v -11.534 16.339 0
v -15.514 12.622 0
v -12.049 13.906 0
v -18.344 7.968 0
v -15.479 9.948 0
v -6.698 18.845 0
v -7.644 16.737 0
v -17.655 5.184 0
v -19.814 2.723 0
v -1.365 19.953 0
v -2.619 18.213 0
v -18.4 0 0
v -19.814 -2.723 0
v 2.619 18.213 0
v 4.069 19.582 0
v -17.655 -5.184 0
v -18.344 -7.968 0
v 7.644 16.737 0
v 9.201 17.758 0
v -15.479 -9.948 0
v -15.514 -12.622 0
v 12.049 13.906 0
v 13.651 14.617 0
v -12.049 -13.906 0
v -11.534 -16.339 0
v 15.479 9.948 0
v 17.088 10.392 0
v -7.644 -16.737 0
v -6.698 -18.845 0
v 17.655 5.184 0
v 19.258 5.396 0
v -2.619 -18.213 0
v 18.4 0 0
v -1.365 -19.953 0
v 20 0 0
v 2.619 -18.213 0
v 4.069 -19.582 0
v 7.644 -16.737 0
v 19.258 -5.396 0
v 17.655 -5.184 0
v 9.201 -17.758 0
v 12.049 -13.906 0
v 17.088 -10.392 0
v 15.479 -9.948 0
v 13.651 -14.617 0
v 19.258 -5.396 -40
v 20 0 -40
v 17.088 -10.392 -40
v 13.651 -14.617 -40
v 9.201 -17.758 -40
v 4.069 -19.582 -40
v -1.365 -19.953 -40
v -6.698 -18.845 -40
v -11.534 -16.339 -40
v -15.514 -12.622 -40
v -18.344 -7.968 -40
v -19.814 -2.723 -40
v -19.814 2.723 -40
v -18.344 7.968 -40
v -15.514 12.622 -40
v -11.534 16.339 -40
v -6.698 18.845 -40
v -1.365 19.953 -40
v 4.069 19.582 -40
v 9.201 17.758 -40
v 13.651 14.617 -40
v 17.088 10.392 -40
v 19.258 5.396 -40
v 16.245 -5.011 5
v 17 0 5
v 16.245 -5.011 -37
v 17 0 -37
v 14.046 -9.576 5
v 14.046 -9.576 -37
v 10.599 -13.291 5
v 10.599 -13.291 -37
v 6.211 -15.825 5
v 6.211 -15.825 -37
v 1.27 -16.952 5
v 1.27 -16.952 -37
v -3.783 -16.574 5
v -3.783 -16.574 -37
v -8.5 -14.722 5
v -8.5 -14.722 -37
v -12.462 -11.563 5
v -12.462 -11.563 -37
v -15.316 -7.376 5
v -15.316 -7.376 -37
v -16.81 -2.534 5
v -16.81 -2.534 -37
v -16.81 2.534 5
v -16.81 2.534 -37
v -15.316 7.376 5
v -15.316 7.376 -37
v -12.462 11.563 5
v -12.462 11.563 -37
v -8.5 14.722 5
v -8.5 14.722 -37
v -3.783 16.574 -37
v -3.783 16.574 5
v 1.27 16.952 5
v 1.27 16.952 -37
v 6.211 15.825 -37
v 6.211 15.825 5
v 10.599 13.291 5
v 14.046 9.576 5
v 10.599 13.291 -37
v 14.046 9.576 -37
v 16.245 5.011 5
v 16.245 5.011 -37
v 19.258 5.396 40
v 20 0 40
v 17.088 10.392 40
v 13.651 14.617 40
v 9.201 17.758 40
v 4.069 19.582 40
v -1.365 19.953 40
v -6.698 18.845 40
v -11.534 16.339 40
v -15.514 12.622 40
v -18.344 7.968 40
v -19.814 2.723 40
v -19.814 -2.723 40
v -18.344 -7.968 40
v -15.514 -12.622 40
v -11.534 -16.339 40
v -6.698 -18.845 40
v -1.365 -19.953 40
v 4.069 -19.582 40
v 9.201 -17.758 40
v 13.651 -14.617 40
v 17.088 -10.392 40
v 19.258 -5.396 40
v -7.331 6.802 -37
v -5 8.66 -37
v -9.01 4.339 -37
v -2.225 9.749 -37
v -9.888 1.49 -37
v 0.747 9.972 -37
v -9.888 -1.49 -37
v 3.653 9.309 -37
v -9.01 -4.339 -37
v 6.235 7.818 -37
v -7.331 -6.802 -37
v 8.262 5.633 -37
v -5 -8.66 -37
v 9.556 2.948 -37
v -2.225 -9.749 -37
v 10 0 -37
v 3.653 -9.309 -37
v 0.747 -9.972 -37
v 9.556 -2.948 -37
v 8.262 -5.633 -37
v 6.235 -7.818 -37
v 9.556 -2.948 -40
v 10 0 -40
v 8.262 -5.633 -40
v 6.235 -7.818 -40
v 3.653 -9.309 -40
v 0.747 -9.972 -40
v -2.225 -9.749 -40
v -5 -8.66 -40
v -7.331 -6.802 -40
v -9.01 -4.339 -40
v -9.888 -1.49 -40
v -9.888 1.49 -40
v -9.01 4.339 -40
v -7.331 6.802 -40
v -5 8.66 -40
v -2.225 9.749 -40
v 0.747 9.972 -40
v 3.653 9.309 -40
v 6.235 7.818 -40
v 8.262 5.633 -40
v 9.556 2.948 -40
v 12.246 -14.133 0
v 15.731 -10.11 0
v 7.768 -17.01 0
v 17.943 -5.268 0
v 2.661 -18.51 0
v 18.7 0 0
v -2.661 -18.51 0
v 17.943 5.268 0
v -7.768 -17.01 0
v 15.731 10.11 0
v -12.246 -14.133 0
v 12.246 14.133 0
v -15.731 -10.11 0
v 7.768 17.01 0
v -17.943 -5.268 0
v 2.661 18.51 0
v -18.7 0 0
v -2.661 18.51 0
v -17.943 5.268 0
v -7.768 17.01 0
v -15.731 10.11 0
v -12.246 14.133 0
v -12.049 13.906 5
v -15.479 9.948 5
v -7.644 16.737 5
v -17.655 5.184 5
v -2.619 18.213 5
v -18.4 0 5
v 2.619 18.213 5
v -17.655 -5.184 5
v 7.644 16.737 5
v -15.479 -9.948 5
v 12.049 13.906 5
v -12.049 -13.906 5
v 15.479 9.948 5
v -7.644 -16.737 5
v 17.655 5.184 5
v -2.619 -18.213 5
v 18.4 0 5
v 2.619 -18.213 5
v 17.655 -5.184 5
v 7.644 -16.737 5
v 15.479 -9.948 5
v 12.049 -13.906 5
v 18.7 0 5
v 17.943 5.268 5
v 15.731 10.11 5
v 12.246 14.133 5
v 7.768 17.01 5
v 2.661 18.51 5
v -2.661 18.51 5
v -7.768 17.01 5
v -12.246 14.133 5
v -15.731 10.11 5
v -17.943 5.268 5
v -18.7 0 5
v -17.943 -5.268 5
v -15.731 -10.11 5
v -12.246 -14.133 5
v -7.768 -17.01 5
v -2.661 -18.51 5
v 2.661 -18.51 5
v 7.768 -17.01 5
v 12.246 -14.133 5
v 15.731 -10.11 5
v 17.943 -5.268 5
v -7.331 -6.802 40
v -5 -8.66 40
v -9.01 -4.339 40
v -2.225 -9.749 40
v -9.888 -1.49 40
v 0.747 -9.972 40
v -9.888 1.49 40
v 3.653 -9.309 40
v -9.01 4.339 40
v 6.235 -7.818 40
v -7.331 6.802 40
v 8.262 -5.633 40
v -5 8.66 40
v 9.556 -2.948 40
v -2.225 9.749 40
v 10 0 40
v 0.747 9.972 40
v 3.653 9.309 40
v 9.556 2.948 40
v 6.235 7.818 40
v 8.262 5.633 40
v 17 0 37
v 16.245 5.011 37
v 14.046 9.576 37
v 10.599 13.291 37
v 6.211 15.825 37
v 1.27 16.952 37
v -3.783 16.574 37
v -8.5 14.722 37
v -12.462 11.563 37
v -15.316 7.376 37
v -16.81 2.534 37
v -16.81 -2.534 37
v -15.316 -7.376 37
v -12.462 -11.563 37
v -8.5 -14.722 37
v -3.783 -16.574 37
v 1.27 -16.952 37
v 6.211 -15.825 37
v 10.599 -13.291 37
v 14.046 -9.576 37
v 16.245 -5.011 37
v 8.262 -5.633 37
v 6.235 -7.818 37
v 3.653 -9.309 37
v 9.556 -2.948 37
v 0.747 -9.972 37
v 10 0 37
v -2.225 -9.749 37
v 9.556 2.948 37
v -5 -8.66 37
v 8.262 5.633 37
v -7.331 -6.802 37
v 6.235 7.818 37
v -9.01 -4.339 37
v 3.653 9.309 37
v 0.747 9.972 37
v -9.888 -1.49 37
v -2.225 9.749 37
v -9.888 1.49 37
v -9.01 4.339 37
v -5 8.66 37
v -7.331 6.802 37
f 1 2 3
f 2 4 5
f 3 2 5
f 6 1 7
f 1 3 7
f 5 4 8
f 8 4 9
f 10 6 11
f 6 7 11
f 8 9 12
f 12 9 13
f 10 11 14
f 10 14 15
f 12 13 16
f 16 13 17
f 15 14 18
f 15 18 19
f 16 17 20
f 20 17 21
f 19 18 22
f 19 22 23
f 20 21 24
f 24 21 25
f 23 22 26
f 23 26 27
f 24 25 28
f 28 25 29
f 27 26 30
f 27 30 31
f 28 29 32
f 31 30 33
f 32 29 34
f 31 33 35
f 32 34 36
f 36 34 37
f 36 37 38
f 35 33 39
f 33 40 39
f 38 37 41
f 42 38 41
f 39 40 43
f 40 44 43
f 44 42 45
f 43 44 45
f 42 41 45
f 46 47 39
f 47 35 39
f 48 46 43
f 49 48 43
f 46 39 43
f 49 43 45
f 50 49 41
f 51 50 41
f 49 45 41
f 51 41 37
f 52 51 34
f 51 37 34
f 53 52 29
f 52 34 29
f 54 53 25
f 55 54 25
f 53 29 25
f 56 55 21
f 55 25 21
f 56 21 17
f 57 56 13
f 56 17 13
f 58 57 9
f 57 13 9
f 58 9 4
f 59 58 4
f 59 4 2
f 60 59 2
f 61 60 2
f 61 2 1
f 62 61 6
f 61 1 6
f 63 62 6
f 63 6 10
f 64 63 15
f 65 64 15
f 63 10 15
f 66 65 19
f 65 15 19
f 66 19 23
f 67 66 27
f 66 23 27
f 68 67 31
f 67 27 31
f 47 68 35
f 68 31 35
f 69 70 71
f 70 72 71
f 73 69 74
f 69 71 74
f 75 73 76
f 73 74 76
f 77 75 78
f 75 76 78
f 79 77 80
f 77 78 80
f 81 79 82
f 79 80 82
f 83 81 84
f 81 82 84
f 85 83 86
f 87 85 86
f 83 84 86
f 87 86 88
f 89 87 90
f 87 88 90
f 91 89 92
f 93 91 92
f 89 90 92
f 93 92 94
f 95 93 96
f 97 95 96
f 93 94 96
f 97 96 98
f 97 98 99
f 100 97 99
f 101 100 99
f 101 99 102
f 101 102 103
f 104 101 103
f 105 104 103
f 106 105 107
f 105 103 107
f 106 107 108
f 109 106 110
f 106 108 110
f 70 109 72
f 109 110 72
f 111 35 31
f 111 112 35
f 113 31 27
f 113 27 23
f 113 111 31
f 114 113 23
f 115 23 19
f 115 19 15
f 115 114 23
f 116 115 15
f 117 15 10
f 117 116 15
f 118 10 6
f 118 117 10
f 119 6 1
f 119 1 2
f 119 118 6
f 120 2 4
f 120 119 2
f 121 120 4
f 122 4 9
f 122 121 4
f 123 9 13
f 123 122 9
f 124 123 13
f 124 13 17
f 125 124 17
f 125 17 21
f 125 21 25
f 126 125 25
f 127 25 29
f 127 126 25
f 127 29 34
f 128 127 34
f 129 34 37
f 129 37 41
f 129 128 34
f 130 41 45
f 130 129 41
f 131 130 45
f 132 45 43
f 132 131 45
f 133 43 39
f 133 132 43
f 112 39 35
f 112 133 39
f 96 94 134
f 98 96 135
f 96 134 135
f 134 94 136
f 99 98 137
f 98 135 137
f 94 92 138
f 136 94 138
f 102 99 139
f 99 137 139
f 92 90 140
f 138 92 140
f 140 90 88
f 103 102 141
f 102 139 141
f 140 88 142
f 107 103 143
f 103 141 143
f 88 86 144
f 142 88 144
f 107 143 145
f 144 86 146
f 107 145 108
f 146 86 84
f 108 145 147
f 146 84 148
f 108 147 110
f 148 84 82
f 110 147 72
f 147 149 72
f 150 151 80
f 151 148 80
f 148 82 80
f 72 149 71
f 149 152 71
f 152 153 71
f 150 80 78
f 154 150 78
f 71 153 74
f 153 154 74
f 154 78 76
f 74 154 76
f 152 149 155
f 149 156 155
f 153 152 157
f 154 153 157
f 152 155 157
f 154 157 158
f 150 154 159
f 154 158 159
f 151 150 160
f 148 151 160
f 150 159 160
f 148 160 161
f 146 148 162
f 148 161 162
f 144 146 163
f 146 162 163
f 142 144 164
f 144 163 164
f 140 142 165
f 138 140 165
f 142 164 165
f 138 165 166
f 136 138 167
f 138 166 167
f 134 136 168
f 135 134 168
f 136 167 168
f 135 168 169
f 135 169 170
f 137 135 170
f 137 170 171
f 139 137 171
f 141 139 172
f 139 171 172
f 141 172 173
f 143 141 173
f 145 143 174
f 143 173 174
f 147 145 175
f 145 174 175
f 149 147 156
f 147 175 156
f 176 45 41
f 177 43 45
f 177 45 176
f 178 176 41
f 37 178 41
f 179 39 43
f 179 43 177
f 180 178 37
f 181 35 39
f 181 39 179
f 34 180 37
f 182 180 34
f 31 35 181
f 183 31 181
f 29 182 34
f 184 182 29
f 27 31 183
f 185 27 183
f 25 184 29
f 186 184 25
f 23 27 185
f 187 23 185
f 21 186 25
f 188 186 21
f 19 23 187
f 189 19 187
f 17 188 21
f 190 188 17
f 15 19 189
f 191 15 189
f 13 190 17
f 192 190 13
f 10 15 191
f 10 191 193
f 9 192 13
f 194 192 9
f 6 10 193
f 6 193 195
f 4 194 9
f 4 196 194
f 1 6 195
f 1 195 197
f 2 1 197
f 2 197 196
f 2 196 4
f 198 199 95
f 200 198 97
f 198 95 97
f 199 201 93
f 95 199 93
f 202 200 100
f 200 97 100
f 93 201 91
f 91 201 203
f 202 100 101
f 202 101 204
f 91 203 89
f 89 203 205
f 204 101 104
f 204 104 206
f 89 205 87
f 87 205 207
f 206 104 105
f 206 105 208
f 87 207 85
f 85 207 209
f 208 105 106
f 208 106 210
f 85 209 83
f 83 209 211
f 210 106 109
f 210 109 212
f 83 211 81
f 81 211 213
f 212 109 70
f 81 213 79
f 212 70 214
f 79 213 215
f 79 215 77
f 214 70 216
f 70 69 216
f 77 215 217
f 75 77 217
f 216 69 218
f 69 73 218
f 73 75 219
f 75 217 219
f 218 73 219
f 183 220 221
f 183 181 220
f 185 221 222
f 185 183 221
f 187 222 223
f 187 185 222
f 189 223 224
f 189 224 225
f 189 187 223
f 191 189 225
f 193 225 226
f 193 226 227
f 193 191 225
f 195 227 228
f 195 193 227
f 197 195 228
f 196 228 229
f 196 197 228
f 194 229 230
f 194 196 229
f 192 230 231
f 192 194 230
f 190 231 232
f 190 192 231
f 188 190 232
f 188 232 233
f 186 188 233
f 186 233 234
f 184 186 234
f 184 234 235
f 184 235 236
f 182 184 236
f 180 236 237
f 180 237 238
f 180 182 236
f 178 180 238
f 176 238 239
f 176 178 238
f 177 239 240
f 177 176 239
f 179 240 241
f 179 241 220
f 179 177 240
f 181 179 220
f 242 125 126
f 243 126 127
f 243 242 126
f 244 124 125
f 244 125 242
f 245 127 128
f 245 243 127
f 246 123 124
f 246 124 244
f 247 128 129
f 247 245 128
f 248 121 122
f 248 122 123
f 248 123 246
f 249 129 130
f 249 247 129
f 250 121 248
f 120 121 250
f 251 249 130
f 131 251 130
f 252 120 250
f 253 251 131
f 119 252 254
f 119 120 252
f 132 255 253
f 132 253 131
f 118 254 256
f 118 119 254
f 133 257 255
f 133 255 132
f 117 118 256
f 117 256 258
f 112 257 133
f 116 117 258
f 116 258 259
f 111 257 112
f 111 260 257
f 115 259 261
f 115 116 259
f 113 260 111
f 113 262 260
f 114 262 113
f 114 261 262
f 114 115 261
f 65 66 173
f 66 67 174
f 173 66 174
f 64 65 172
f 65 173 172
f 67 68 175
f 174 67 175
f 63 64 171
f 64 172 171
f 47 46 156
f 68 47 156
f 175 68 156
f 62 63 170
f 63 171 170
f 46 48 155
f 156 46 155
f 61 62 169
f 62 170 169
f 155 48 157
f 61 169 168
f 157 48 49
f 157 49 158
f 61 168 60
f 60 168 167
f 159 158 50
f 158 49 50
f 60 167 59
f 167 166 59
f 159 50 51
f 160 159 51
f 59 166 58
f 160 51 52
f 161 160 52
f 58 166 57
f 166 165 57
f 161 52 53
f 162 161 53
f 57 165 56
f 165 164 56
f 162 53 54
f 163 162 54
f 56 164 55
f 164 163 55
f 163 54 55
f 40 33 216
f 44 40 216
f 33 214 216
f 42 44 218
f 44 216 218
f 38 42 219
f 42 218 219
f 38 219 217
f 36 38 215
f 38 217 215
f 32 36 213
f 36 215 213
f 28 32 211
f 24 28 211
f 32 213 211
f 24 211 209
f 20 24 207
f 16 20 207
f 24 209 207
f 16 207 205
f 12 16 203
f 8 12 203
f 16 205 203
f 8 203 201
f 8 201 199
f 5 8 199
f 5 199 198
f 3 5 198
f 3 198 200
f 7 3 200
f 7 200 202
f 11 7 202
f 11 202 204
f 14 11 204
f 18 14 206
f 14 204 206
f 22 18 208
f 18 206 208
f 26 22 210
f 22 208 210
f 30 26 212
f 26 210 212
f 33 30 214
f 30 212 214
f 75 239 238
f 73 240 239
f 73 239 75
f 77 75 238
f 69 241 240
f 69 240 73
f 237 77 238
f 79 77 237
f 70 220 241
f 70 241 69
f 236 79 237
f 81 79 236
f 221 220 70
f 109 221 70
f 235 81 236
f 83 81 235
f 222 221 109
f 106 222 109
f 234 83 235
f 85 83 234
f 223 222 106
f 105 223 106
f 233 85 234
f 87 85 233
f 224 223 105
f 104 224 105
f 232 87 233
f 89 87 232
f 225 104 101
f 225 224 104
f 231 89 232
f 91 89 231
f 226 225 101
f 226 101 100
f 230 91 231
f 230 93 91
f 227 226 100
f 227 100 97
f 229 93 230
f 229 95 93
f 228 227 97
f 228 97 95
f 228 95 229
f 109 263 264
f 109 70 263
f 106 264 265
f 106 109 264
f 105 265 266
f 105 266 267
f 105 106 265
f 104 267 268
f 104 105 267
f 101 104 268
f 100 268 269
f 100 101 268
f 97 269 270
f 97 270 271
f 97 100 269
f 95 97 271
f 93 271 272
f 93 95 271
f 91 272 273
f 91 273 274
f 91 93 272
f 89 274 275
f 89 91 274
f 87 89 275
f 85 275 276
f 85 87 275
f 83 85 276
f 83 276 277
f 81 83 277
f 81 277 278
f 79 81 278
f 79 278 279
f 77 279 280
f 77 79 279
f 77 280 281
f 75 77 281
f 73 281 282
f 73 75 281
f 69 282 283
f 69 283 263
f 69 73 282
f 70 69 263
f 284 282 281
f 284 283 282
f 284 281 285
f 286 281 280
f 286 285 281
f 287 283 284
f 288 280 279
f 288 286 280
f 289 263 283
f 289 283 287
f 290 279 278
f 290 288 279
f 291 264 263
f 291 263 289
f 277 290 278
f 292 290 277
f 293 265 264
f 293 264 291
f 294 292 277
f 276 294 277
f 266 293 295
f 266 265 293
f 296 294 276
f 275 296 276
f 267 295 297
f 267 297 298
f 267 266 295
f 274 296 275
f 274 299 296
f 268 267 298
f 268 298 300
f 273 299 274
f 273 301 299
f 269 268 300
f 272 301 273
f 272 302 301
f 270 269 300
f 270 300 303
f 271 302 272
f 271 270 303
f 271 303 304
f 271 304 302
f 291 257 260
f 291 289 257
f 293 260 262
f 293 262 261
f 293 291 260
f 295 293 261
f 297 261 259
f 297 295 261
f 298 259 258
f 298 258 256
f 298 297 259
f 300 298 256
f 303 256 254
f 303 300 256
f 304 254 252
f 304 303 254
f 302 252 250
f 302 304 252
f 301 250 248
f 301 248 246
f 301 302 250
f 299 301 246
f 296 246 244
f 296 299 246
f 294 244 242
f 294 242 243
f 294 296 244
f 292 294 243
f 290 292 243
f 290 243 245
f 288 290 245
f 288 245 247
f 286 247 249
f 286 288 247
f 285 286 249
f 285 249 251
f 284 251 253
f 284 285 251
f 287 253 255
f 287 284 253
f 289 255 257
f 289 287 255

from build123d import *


with BuildPart() as f1:
    # F0 (on Front) → F1 (revolve)
    with BuildSketch(Plane.XZ):
        Polygon((20, 40), (10, 40), (10, 37), (17, 37), (17, 5), (18.7, 5), (18.7, 0), (20, 0), align=None)
    revolve(axis=Axis((0, 0, 20), (0, 0, 1)))


with BuildPart() as f3:
    # F2 (on Front) → F3 (revolve)
    with BuildSketch(Plane.XZ):
        Polygon((20, -40), (20, 0), (18.4, 0), (18.4, 5), (17, 5), (17, 0), (17, -37), (10, -37), (10, -40), align=None)
    revolve(axis=Axis((0, 0, -9.94769), (0, 0, -1)))


solid = Compound([f1.part, f3.part])
